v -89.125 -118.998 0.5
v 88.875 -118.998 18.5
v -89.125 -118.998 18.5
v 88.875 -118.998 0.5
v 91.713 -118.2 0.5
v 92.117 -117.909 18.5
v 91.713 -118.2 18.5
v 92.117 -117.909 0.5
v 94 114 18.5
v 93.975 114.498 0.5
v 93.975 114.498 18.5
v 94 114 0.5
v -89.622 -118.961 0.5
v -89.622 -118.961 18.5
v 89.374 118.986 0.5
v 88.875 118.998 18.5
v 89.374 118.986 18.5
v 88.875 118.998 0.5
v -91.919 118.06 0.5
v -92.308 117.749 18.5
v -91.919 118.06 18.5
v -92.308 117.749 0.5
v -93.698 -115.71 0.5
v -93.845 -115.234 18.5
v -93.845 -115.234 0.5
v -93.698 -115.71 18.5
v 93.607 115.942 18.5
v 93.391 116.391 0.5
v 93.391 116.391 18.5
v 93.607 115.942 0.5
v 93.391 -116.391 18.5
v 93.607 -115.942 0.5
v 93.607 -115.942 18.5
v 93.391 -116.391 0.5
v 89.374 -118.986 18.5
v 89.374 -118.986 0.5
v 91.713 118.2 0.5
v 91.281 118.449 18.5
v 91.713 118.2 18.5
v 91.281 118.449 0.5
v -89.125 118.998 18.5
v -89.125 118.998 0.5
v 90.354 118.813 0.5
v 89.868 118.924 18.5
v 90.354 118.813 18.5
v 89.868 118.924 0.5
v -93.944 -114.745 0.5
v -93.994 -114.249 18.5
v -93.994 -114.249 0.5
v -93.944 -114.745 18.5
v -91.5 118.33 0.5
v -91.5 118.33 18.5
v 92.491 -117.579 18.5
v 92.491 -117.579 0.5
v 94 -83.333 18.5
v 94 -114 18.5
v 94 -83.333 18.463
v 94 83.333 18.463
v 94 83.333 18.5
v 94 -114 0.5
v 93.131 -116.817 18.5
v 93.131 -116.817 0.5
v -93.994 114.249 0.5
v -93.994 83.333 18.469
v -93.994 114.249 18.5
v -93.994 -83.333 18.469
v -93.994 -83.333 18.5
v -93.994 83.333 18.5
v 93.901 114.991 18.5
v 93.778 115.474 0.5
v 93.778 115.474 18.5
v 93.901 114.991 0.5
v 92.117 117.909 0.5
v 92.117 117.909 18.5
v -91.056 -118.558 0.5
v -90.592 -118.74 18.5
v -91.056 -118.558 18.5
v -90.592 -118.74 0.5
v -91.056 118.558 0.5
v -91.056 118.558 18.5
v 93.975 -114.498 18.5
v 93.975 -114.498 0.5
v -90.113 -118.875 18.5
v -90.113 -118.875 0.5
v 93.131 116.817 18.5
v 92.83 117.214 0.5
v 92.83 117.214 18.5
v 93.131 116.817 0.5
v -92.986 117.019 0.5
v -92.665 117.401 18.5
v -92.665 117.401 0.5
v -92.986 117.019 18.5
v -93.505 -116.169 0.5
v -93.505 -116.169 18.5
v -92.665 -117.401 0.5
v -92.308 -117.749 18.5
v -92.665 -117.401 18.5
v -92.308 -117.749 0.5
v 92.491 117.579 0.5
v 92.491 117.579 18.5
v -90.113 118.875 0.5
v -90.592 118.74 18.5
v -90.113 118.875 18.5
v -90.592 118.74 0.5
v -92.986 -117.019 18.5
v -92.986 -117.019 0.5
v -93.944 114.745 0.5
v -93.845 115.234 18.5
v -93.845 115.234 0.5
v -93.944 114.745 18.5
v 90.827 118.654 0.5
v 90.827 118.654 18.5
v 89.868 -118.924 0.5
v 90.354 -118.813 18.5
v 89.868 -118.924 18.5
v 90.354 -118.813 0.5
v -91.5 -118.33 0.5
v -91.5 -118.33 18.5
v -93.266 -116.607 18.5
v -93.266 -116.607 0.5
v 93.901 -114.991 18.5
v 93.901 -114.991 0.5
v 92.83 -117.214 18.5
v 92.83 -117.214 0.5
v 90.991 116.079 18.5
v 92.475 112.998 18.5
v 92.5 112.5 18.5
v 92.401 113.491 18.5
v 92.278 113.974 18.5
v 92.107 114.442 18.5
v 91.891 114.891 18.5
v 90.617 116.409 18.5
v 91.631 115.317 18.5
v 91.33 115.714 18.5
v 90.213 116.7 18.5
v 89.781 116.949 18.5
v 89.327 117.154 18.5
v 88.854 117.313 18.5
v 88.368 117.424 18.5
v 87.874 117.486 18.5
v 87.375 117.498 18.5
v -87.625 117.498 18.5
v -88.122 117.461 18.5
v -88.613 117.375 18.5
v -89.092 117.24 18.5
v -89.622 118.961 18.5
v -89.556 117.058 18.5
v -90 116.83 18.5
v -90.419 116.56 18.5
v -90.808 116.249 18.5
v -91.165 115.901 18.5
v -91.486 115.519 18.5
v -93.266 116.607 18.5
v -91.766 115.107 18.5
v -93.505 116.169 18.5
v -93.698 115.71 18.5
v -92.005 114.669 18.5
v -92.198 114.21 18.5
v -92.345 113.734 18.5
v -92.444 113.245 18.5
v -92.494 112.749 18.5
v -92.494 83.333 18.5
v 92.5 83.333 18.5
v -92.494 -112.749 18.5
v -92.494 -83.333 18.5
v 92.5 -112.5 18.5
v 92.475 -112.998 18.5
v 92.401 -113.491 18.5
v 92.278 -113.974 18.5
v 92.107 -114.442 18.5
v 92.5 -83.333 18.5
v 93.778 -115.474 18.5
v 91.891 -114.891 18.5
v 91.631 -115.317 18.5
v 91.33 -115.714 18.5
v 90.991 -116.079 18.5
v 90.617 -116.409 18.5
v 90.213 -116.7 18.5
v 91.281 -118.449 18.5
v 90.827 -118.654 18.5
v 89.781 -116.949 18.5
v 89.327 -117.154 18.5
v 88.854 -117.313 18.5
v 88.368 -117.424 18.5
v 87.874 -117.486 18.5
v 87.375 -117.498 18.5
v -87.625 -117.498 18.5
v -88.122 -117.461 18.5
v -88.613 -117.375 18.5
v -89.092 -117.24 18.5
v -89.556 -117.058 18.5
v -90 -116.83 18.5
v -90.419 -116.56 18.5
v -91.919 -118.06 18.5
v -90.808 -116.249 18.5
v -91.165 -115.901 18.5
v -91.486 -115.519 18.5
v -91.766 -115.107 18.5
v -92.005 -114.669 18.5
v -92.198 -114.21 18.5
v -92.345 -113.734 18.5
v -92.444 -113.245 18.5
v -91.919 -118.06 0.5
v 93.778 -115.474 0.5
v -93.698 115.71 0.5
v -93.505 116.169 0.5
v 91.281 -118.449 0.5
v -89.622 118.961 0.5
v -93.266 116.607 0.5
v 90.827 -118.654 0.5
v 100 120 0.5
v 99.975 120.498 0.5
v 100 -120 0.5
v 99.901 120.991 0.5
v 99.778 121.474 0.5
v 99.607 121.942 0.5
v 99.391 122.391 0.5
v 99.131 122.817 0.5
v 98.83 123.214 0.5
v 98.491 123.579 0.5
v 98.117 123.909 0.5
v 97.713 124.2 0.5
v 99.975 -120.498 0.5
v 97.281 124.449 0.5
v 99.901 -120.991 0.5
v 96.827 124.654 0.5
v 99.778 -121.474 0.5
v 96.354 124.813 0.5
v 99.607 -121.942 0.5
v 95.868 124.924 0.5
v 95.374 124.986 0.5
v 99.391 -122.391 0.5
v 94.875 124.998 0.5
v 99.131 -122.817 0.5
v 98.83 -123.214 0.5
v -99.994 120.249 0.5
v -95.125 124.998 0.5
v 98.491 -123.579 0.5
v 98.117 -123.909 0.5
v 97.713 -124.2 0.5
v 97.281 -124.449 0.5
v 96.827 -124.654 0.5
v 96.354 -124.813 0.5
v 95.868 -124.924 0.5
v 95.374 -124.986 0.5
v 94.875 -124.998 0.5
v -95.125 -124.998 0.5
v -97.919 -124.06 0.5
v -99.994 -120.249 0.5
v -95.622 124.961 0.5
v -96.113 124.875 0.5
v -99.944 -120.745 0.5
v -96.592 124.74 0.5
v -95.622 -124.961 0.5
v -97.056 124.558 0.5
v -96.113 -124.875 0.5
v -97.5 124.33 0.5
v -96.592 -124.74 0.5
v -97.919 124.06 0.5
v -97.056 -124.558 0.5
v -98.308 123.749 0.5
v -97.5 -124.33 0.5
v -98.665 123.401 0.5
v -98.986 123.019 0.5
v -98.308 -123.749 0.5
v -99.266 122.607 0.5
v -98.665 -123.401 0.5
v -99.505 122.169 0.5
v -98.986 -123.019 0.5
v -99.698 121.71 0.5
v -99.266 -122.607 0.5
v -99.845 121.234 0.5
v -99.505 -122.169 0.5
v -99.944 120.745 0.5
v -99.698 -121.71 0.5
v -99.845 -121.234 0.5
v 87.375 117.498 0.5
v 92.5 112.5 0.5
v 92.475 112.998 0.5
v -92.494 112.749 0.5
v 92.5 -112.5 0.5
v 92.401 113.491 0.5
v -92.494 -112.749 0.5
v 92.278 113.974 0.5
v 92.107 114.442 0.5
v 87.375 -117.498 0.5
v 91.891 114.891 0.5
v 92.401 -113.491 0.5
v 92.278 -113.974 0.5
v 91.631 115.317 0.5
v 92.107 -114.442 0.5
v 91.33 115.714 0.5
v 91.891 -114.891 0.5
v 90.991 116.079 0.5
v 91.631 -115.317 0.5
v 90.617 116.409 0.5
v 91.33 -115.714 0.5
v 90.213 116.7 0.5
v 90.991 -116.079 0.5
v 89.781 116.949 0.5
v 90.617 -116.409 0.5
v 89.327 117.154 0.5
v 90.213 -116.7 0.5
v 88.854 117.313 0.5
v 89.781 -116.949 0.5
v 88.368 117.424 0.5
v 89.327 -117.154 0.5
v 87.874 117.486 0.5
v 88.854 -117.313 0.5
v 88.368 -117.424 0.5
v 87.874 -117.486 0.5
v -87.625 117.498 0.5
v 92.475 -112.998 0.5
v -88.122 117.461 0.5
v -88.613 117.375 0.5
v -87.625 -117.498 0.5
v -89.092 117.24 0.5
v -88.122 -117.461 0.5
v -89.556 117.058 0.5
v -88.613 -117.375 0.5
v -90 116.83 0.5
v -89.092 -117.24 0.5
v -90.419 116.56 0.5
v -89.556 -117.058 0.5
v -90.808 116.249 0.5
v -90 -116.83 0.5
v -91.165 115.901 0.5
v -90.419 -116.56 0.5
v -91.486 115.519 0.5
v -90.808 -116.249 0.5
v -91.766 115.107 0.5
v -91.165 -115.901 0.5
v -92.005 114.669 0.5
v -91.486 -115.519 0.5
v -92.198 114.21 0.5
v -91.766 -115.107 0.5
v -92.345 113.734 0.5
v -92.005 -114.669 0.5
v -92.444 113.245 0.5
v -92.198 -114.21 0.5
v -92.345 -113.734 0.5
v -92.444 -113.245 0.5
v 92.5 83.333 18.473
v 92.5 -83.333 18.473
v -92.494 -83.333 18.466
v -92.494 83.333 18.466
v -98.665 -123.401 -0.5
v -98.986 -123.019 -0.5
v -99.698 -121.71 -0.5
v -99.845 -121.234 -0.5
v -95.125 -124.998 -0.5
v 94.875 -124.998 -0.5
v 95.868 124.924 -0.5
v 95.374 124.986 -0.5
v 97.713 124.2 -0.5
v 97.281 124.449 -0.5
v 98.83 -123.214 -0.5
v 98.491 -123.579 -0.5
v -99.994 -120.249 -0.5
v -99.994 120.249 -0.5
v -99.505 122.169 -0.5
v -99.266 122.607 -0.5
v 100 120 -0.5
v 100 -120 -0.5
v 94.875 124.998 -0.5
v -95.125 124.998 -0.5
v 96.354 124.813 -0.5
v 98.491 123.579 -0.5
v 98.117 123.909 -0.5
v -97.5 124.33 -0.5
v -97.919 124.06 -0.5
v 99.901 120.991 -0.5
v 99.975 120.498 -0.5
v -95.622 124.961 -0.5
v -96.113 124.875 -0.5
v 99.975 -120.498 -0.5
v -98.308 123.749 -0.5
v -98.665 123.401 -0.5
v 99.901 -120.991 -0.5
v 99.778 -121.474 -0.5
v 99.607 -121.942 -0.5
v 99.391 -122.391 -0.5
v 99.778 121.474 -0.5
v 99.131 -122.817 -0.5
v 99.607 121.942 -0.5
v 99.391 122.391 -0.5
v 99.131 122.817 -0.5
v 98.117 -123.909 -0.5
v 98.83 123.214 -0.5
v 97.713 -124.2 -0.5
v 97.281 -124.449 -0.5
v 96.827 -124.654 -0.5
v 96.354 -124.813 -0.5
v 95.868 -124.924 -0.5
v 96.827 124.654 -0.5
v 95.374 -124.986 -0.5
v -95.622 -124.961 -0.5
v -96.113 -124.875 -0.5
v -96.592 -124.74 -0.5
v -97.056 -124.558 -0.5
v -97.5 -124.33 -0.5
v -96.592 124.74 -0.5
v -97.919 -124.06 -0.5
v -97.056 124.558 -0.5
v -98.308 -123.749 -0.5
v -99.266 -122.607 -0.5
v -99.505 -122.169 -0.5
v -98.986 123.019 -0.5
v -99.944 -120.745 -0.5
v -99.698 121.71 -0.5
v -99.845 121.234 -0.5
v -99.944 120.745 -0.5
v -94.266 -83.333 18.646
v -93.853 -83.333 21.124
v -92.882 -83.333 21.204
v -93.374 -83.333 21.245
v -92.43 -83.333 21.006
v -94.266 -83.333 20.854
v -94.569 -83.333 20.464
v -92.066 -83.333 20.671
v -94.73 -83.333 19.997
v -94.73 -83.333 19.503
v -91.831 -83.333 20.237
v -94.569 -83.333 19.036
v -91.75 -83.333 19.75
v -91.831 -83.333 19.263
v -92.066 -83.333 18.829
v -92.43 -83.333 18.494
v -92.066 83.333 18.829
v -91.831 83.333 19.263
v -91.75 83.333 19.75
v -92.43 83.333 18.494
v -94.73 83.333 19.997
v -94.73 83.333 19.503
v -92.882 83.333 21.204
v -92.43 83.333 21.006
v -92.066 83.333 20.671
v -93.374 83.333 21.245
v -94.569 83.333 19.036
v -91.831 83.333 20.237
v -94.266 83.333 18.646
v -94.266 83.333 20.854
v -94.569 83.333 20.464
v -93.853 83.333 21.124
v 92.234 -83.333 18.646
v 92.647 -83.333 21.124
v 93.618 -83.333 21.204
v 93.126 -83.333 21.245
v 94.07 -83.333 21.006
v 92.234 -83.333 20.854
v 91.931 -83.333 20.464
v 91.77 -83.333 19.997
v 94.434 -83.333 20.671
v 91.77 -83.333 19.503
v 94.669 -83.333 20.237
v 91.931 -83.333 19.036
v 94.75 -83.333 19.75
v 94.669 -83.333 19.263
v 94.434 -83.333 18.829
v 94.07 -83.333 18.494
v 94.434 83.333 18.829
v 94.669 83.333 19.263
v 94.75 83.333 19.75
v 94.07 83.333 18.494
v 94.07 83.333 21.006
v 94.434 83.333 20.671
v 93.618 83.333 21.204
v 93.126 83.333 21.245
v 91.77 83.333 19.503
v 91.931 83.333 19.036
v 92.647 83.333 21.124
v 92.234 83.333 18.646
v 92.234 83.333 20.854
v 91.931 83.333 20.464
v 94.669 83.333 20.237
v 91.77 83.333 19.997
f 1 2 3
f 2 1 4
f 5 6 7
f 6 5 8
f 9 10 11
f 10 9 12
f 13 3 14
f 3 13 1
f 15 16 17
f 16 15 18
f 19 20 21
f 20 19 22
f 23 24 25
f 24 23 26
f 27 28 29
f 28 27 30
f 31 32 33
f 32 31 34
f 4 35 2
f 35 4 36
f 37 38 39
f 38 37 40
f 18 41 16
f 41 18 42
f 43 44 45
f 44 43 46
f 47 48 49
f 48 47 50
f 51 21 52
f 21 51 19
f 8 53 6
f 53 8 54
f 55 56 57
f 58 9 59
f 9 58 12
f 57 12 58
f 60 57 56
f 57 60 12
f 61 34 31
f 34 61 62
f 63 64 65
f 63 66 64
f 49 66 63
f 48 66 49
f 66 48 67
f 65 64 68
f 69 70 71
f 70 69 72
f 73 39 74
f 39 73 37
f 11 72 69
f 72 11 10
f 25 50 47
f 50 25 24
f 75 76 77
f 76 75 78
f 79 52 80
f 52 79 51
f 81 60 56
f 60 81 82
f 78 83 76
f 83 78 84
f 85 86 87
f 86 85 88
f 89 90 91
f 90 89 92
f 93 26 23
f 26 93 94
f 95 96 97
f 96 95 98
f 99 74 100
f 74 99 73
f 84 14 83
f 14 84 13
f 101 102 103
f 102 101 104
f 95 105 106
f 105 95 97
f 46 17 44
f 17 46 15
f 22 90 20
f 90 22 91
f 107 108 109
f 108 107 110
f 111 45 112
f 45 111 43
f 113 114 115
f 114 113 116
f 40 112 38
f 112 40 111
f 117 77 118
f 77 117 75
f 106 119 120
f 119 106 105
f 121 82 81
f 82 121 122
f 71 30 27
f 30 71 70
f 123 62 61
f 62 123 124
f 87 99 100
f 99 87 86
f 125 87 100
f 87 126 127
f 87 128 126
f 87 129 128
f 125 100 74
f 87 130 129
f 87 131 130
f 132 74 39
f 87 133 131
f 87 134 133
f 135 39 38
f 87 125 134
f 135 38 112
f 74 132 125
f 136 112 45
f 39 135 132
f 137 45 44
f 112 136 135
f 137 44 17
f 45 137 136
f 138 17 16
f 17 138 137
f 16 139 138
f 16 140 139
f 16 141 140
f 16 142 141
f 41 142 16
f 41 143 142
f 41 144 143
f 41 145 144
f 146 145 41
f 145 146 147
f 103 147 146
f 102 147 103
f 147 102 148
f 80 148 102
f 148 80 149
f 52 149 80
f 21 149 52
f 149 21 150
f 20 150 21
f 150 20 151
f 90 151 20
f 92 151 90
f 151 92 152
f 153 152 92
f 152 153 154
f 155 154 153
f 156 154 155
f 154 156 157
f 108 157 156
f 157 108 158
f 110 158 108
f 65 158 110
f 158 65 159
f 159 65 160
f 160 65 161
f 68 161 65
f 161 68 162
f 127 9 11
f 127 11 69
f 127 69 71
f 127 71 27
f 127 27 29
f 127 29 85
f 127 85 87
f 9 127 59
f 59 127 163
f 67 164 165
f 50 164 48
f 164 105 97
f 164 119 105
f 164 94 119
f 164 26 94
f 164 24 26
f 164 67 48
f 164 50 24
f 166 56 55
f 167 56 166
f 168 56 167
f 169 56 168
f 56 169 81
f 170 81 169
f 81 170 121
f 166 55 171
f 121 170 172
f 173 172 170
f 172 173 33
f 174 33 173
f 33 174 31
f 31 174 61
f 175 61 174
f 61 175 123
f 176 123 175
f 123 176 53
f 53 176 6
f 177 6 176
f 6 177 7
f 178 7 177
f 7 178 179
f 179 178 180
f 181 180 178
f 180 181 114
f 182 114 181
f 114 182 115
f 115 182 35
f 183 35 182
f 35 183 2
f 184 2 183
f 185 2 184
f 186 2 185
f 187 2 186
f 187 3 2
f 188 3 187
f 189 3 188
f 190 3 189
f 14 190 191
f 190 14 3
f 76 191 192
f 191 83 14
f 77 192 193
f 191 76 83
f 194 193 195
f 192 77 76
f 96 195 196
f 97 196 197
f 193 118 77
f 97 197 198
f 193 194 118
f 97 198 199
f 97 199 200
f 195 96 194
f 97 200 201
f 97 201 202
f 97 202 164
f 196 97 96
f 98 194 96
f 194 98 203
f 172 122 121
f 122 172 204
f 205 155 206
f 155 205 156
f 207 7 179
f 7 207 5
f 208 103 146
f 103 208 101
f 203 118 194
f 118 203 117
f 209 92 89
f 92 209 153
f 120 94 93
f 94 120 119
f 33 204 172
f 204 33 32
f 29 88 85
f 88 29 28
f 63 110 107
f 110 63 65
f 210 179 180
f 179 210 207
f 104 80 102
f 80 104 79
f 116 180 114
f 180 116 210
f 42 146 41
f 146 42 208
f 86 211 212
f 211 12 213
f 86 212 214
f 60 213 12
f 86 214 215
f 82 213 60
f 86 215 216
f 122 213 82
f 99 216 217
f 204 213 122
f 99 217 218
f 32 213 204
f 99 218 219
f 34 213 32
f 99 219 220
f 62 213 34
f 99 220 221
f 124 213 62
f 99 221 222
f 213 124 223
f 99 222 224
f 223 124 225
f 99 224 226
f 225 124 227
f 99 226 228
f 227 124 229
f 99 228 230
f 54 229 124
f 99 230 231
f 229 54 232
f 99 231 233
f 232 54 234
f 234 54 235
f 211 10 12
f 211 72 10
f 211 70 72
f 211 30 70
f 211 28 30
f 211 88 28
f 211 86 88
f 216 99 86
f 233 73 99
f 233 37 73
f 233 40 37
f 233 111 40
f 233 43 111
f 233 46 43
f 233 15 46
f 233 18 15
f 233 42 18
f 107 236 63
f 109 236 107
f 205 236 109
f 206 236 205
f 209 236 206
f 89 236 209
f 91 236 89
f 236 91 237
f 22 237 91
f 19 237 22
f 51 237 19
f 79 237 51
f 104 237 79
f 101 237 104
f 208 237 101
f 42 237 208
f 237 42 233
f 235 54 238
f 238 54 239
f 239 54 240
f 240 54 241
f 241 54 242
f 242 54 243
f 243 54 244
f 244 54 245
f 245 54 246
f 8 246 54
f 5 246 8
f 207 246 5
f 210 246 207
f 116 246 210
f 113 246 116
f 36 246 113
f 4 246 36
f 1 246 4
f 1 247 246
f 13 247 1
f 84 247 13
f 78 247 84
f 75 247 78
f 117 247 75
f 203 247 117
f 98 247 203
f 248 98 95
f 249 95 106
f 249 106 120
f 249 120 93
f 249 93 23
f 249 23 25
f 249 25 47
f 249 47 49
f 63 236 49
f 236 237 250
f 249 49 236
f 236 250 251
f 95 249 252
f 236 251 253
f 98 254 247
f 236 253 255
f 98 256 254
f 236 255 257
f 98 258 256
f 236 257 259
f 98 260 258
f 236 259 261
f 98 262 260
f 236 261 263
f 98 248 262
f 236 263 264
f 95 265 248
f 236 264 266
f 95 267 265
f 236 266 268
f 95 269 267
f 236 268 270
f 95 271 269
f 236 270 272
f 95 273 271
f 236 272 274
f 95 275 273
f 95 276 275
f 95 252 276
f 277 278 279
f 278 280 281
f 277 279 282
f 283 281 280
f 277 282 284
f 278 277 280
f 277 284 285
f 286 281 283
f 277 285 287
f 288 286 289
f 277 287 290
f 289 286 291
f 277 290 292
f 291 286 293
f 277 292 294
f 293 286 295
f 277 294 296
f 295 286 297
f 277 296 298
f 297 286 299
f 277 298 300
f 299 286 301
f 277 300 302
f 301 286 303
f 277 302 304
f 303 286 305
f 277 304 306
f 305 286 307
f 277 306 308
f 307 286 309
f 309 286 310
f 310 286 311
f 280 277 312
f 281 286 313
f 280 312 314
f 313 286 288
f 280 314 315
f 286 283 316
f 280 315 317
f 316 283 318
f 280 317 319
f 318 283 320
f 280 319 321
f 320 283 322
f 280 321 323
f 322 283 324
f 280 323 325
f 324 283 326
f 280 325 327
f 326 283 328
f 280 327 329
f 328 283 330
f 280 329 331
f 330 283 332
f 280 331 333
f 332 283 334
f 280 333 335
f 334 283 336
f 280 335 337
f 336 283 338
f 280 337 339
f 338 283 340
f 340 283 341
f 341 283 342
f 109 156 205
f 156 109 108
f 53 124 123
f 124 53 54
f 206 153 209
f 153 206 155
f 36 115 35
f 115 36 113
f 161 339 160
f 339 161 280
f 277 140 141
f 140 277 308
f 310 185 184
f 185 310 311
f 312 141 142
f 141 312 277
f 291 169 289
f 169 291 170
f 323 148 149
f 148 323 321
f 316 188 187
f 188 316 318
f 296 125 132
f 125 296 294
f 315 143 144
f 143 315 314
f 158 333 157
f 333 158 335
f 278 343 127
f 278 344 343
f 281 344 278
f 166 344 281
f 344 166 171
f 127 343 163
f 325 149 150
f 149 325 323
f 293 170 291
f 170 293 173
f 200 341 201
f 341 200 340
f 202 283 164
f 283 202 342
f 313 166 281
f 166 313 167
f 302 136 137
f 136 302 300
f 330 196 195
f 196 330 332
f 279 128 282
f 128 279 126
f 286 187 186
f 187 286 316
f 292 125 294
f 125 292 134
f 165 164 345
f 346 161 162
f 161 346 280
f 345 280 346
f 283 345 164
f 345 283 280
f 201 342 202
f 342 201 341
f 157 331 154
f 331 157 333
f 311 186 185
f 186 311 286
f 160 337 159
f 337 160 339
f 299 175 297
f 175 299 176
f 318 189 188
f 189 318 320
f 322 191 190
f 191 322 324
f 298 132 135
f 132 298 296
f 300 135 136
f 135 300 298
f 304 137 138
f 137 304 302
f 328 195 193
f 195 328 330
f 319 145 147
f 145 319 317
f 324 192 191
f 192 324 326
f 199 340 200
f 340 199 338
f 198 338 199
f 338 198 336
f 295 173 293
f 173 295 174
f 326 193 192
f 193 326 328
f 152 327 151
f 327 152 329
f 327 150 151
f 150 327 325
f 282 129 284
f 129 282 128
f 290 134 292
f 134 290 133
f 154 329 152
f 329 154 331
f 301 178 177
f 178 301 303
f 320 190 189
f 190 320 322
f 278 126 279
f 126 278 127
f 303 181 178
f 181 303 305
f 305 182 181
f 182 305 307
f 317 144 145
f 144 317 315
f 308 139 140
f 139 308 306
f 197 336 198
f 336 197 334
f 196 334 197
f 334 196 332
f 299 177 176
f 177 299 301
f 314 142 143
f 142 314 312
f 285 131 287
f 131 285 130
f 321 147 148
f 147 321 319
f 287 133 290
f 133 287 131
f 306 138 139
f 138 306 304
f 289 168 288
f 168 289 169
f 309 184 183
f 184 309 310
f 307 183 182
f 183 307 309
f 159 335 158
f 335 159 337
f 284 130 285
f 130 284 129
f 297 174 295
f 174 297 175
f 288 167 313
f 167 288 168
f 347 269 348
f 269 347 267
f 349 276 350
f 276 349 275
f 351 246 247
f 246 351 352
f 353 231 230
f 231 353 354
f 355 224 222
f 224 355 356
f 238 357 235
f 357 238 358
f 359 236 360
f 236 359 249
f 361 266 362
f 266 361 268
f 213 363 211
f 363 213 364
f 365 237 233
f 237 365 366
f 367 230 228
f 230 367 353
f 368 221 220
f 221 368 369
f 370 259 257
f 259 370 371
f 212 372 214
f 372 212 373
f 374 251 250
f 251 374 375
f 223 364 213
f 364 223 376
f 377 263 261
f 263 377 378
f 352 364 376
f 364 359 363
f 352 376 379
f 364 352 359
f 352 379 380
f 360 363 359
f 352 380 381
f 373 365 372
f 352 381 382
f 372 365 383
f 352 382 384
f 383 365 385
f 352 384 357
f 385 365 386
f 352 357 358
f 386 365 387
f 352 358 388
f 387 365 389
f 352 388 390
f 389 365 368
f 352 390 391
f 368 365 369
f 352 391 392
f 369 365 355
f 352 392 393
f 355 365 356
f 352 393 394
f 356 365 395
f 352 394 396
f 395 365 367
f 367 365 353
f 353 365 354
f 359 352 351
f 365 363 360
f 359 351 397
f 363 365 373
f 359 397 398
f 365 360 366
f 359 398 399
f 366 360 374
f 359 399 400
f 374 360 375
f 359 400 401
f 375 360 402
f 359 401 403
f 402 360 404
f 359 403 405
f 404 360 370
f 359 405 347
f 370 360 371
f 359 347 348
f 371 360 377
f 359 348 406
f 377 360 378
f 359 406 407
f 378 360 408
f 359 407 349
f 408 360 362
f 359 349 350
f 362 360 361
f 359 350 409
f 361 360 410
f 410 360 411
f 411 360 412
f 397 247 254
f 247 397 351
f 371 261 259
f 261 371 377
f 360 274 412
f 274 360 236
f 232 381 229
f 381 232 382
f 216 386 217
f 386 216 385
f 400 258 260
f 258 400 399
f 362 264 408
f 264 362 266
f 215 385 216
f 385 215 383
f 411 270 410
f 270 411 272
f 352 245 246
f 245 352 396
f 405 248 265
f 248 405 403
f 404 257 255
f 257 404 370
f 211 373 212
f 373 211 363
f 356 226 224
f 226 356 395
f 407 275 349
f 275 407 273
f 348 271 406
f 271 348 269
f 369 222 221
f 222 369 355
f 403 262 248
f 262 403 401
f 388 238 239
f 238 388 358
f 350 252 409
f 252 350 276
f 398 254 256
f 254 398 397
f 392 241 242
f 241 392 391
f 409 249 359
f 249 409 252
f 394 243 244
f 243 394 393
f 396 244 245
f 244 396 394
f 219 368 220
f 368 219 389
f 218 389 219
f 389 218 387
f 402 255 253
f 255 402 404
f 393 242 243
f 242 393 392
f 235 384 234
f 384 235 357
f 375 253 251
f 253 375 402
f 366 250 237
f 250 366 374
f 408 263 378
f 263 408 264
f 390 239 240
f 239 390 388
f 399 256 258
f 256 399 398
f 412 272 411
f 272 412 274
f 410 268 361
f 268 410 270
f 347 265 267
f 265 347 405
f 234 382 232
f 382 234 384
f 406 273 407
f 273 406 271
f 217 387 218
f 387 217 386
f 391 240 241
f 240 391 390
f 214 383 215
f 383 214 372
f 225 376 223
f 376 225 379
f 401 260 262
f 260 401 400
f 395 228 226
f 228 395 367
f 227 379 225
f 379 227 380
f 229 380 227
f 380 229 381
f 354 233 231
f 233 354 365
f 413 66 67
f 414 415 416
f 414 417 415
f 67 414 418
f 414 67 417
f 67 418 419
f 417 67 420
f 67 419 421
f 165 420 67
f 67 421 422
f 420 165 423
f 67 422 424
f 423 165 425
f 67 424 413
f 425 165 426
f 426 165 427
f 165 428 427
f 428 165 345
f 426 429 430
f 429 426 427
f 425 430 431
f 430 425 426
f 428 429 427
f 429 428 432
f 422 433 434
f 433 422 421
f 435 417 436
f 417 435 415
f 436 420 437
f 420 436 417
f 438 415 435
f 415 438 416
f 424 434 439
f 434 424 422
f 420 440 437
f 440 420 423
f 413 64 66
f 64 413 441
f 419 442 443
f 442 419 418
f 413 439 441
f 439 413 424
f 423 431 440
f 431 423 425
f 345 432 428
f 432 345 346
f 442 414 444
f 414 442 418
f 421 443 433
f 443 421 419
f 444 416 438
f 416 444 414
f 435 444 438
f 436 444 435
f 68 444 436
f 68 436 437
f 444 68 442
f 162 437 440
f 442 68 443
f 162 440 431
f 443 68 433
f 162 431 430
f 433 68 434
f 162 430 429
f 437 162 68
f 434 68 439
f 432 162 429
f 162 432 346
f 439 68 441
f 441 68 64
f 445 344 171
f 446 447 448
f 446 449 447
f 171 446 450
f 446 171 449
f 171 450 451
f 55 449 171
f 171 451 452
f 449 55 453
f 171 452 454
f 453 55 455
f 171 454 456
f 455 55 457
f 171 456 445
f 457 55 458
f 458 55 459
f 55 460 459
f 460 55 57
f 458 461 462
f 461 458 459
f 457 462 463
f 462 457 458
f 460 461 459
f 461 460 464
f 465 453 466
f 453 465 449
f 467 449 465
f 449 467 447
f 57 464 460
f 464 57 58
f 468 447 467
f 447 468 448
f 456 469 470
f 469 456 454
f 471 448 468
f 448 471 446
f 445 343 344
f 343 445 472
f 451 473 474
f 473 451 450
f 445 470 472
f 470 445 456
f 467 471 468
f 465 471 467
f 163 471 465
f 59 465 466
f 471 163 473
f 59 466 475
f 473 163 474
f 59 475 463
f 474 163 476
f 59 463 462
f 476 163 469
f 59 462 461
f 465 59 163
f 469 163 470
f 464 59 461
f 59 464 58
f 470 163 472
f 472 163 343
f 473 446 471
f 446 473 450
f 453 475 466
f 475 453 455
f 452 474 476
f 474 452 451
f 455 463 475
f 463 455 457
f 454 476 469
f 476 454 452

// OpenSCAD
$fa=0.5; // default minimum facet angle is now 0.5
$fs=0.5; // default minimum facet size is now 0.5 mm

//Currently nlength (330.2mm) * sizefactor (0.61515) = 203.123mm (7.997in).
//Currently nwidth (189.69mm) * sizefactor (0/61515) = 116.688mm (4.595in).

// Variables.
botLength    = 250;
botWidth     = 200;
botHeight    = 1;
cornerRadius = 5;

lipOffset    = 12;
lipThickness = 3;
lipHeight    = 18;

// Bottom.
drawBox( botLength, botWidth, botHeight, cornerRadius );

// Lip.
difference()
{
  translate( [ 0, 0, ( botHeight + lipHeight ) / 2 ] )
    color( [ 1, 0, 0 ] ) drawBox( botLength - lipOffset, botWidth - lipOffset, lipHeight, cornerRadius );

  translate( [ 0, 0, ( botHeight + lipHeight ) / 2 ] )
    color( [ 0, 1, 0 ] ) drawBox( botLength - lipOffset - lipThickness, botWidth - lipOffset - lipThickness, lipHeight + 2, cornerRadius );
}

// Flanges.
flangeRadius = 1.5;
flangeX      = ( botWidth - lipOffset - lipThickness / 2 ) / 2;
drawFlange( -flangeX, flangeRadius );
drawFlange(  flangeX, flangeRadius );

module drawBox( length, width, height, cornerRadius )
{
  hull()
  {
    // Upper left rounded edge.
    translate( [ ( width - cornerRadius * 2 ) / 2, ( -length + cornerRadius * 2 ) / 2, -height / 2 ] )
      cylinder( height, cornerRadius, cornerRadius );
    
    // Upper right rounded edge.
    translate( [ ( -width + cornerRadius * 2 ) / 2, ( -length + cornerRadius * 2 ) / 2, -height / 2 ] )
      cylinder( height, cornerRadius, cornerRadius );
    
    // Lower left rounded edge.
    translate( [ ( width - cornerRadius * 2 ) / 2, ( length - cornerRadius * 2 ) / 2, -height / 2 ] )
      cylinder( height, cornerRadius, cornerRadius );
    
    // Lower right rounded edge.
    translate( [ ( -width + cornerRadius * 2 ) / 2, ( length - cornerRadius * 2 ) / 2, -height / 2 ] )
      cylinder( height, cornerRadius, cornerRadius );
  }
}

module drawFlange( position, radius)
{
  rotate( [ -90, 0, 0 ] ) 
    translate( [ position, -( botHeight / 2 + lipHeight + radius - 0.25 ), 0 ] ) 
      cylinder( botLength / 1.5, radius, radius, true );
}
